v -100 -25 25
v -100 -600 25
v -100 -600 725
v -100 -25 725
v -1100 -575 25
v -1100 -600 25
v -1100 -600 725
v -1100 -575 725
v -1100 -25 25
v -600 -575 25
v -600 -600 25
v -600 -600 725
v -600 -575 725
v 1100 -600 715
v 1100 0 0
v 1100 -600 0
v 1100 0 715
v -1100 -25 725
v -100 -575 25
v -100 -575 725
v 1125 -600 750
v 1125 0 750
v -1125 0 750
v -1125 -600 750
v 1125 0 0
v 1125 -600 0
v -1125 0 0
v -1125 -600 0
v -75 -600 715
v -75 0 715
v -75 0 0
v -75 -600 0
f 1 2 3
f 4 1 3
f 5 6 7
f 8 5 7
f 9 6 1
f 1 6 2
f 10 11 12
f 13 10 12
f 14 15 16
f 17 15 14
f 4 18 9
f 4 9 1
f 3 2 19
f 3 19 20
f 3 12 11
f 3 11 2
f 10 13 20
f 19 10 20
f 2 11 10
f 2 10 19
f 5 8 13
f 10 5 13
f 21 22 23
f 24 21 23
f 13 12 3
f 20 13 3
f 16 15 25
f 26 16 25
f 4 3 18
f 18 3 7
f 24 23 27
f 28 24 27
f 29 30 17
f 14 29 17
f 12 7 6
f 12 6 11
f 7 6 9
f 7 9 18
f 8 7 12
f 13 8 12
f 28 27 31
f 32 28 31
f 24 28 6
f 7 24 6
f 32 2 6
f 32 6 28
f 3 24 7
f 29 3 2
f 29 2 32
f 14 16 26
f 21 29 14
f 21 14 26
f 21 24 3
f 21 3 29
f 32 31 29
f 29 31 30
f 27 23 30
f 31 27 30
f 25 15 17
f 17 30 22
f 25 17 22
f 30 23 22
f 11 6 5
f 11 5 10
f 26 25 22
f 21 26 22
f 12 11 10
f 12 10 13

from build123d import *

# Parameters (mm, degrees)
F0_W     = 25
F0_H     = 715
F1_DEPTH = 600
F2_W     = 500
F2_H     = 700
F3_DEPTH = 575
F4_DEPTH = 25
F5_DEPTH = 25


with BuildPart() as f1:
    # F0 (on Front) → F1 (new body)
    with BuildSketch(Plane.XZ):
        Polygon((-1125, 750), (-1125, 0), (-75, 0), (-75, 715), (-75, 750), align=None)
        Polygon((-75, 750), (-75, 715), (1100, 715), (1125, 715), (1125, 750), align=None)
        with Locations((1112.5, 357.5)):
            Rectangle(F0_W, F0_H)
    extrude(amount=F1_DEPTH)

    # F2 (on face) → F3 (cut, through all)
    with BuildSketch(Plane.XZ.offset(600)):
        with Locations((-850, 375)):
            Rectangle(F2_W, F2_H)
        with Locations((-350, 375)):
            Rectangle(F2_W, F2_H)
    extrude(amount=-F3_DEPTH, mode=Mode.SUBTRACT)


with BuildPart() as f4:
    # F2 (on face) → F4 (new body)
    with BuildSketch(Plane.XZ.offset(600)):
        with Locations((-850, 375)):
            Rectangle(F2_W, F2_H)
    extrude(amount=-F4_DEPTH)


with BuildPart() as f5:
    # F2 (on face) → F5 (new body)
    with BuildSketch(Plane.XZ.offset(600)):
        with Locations((-350, 375)):
            Rectangle(F2_W, F2_H)
    extrude(amount=-F5_DEPTH)


solid = Compound([f1.part, f4.part, f5.part])
